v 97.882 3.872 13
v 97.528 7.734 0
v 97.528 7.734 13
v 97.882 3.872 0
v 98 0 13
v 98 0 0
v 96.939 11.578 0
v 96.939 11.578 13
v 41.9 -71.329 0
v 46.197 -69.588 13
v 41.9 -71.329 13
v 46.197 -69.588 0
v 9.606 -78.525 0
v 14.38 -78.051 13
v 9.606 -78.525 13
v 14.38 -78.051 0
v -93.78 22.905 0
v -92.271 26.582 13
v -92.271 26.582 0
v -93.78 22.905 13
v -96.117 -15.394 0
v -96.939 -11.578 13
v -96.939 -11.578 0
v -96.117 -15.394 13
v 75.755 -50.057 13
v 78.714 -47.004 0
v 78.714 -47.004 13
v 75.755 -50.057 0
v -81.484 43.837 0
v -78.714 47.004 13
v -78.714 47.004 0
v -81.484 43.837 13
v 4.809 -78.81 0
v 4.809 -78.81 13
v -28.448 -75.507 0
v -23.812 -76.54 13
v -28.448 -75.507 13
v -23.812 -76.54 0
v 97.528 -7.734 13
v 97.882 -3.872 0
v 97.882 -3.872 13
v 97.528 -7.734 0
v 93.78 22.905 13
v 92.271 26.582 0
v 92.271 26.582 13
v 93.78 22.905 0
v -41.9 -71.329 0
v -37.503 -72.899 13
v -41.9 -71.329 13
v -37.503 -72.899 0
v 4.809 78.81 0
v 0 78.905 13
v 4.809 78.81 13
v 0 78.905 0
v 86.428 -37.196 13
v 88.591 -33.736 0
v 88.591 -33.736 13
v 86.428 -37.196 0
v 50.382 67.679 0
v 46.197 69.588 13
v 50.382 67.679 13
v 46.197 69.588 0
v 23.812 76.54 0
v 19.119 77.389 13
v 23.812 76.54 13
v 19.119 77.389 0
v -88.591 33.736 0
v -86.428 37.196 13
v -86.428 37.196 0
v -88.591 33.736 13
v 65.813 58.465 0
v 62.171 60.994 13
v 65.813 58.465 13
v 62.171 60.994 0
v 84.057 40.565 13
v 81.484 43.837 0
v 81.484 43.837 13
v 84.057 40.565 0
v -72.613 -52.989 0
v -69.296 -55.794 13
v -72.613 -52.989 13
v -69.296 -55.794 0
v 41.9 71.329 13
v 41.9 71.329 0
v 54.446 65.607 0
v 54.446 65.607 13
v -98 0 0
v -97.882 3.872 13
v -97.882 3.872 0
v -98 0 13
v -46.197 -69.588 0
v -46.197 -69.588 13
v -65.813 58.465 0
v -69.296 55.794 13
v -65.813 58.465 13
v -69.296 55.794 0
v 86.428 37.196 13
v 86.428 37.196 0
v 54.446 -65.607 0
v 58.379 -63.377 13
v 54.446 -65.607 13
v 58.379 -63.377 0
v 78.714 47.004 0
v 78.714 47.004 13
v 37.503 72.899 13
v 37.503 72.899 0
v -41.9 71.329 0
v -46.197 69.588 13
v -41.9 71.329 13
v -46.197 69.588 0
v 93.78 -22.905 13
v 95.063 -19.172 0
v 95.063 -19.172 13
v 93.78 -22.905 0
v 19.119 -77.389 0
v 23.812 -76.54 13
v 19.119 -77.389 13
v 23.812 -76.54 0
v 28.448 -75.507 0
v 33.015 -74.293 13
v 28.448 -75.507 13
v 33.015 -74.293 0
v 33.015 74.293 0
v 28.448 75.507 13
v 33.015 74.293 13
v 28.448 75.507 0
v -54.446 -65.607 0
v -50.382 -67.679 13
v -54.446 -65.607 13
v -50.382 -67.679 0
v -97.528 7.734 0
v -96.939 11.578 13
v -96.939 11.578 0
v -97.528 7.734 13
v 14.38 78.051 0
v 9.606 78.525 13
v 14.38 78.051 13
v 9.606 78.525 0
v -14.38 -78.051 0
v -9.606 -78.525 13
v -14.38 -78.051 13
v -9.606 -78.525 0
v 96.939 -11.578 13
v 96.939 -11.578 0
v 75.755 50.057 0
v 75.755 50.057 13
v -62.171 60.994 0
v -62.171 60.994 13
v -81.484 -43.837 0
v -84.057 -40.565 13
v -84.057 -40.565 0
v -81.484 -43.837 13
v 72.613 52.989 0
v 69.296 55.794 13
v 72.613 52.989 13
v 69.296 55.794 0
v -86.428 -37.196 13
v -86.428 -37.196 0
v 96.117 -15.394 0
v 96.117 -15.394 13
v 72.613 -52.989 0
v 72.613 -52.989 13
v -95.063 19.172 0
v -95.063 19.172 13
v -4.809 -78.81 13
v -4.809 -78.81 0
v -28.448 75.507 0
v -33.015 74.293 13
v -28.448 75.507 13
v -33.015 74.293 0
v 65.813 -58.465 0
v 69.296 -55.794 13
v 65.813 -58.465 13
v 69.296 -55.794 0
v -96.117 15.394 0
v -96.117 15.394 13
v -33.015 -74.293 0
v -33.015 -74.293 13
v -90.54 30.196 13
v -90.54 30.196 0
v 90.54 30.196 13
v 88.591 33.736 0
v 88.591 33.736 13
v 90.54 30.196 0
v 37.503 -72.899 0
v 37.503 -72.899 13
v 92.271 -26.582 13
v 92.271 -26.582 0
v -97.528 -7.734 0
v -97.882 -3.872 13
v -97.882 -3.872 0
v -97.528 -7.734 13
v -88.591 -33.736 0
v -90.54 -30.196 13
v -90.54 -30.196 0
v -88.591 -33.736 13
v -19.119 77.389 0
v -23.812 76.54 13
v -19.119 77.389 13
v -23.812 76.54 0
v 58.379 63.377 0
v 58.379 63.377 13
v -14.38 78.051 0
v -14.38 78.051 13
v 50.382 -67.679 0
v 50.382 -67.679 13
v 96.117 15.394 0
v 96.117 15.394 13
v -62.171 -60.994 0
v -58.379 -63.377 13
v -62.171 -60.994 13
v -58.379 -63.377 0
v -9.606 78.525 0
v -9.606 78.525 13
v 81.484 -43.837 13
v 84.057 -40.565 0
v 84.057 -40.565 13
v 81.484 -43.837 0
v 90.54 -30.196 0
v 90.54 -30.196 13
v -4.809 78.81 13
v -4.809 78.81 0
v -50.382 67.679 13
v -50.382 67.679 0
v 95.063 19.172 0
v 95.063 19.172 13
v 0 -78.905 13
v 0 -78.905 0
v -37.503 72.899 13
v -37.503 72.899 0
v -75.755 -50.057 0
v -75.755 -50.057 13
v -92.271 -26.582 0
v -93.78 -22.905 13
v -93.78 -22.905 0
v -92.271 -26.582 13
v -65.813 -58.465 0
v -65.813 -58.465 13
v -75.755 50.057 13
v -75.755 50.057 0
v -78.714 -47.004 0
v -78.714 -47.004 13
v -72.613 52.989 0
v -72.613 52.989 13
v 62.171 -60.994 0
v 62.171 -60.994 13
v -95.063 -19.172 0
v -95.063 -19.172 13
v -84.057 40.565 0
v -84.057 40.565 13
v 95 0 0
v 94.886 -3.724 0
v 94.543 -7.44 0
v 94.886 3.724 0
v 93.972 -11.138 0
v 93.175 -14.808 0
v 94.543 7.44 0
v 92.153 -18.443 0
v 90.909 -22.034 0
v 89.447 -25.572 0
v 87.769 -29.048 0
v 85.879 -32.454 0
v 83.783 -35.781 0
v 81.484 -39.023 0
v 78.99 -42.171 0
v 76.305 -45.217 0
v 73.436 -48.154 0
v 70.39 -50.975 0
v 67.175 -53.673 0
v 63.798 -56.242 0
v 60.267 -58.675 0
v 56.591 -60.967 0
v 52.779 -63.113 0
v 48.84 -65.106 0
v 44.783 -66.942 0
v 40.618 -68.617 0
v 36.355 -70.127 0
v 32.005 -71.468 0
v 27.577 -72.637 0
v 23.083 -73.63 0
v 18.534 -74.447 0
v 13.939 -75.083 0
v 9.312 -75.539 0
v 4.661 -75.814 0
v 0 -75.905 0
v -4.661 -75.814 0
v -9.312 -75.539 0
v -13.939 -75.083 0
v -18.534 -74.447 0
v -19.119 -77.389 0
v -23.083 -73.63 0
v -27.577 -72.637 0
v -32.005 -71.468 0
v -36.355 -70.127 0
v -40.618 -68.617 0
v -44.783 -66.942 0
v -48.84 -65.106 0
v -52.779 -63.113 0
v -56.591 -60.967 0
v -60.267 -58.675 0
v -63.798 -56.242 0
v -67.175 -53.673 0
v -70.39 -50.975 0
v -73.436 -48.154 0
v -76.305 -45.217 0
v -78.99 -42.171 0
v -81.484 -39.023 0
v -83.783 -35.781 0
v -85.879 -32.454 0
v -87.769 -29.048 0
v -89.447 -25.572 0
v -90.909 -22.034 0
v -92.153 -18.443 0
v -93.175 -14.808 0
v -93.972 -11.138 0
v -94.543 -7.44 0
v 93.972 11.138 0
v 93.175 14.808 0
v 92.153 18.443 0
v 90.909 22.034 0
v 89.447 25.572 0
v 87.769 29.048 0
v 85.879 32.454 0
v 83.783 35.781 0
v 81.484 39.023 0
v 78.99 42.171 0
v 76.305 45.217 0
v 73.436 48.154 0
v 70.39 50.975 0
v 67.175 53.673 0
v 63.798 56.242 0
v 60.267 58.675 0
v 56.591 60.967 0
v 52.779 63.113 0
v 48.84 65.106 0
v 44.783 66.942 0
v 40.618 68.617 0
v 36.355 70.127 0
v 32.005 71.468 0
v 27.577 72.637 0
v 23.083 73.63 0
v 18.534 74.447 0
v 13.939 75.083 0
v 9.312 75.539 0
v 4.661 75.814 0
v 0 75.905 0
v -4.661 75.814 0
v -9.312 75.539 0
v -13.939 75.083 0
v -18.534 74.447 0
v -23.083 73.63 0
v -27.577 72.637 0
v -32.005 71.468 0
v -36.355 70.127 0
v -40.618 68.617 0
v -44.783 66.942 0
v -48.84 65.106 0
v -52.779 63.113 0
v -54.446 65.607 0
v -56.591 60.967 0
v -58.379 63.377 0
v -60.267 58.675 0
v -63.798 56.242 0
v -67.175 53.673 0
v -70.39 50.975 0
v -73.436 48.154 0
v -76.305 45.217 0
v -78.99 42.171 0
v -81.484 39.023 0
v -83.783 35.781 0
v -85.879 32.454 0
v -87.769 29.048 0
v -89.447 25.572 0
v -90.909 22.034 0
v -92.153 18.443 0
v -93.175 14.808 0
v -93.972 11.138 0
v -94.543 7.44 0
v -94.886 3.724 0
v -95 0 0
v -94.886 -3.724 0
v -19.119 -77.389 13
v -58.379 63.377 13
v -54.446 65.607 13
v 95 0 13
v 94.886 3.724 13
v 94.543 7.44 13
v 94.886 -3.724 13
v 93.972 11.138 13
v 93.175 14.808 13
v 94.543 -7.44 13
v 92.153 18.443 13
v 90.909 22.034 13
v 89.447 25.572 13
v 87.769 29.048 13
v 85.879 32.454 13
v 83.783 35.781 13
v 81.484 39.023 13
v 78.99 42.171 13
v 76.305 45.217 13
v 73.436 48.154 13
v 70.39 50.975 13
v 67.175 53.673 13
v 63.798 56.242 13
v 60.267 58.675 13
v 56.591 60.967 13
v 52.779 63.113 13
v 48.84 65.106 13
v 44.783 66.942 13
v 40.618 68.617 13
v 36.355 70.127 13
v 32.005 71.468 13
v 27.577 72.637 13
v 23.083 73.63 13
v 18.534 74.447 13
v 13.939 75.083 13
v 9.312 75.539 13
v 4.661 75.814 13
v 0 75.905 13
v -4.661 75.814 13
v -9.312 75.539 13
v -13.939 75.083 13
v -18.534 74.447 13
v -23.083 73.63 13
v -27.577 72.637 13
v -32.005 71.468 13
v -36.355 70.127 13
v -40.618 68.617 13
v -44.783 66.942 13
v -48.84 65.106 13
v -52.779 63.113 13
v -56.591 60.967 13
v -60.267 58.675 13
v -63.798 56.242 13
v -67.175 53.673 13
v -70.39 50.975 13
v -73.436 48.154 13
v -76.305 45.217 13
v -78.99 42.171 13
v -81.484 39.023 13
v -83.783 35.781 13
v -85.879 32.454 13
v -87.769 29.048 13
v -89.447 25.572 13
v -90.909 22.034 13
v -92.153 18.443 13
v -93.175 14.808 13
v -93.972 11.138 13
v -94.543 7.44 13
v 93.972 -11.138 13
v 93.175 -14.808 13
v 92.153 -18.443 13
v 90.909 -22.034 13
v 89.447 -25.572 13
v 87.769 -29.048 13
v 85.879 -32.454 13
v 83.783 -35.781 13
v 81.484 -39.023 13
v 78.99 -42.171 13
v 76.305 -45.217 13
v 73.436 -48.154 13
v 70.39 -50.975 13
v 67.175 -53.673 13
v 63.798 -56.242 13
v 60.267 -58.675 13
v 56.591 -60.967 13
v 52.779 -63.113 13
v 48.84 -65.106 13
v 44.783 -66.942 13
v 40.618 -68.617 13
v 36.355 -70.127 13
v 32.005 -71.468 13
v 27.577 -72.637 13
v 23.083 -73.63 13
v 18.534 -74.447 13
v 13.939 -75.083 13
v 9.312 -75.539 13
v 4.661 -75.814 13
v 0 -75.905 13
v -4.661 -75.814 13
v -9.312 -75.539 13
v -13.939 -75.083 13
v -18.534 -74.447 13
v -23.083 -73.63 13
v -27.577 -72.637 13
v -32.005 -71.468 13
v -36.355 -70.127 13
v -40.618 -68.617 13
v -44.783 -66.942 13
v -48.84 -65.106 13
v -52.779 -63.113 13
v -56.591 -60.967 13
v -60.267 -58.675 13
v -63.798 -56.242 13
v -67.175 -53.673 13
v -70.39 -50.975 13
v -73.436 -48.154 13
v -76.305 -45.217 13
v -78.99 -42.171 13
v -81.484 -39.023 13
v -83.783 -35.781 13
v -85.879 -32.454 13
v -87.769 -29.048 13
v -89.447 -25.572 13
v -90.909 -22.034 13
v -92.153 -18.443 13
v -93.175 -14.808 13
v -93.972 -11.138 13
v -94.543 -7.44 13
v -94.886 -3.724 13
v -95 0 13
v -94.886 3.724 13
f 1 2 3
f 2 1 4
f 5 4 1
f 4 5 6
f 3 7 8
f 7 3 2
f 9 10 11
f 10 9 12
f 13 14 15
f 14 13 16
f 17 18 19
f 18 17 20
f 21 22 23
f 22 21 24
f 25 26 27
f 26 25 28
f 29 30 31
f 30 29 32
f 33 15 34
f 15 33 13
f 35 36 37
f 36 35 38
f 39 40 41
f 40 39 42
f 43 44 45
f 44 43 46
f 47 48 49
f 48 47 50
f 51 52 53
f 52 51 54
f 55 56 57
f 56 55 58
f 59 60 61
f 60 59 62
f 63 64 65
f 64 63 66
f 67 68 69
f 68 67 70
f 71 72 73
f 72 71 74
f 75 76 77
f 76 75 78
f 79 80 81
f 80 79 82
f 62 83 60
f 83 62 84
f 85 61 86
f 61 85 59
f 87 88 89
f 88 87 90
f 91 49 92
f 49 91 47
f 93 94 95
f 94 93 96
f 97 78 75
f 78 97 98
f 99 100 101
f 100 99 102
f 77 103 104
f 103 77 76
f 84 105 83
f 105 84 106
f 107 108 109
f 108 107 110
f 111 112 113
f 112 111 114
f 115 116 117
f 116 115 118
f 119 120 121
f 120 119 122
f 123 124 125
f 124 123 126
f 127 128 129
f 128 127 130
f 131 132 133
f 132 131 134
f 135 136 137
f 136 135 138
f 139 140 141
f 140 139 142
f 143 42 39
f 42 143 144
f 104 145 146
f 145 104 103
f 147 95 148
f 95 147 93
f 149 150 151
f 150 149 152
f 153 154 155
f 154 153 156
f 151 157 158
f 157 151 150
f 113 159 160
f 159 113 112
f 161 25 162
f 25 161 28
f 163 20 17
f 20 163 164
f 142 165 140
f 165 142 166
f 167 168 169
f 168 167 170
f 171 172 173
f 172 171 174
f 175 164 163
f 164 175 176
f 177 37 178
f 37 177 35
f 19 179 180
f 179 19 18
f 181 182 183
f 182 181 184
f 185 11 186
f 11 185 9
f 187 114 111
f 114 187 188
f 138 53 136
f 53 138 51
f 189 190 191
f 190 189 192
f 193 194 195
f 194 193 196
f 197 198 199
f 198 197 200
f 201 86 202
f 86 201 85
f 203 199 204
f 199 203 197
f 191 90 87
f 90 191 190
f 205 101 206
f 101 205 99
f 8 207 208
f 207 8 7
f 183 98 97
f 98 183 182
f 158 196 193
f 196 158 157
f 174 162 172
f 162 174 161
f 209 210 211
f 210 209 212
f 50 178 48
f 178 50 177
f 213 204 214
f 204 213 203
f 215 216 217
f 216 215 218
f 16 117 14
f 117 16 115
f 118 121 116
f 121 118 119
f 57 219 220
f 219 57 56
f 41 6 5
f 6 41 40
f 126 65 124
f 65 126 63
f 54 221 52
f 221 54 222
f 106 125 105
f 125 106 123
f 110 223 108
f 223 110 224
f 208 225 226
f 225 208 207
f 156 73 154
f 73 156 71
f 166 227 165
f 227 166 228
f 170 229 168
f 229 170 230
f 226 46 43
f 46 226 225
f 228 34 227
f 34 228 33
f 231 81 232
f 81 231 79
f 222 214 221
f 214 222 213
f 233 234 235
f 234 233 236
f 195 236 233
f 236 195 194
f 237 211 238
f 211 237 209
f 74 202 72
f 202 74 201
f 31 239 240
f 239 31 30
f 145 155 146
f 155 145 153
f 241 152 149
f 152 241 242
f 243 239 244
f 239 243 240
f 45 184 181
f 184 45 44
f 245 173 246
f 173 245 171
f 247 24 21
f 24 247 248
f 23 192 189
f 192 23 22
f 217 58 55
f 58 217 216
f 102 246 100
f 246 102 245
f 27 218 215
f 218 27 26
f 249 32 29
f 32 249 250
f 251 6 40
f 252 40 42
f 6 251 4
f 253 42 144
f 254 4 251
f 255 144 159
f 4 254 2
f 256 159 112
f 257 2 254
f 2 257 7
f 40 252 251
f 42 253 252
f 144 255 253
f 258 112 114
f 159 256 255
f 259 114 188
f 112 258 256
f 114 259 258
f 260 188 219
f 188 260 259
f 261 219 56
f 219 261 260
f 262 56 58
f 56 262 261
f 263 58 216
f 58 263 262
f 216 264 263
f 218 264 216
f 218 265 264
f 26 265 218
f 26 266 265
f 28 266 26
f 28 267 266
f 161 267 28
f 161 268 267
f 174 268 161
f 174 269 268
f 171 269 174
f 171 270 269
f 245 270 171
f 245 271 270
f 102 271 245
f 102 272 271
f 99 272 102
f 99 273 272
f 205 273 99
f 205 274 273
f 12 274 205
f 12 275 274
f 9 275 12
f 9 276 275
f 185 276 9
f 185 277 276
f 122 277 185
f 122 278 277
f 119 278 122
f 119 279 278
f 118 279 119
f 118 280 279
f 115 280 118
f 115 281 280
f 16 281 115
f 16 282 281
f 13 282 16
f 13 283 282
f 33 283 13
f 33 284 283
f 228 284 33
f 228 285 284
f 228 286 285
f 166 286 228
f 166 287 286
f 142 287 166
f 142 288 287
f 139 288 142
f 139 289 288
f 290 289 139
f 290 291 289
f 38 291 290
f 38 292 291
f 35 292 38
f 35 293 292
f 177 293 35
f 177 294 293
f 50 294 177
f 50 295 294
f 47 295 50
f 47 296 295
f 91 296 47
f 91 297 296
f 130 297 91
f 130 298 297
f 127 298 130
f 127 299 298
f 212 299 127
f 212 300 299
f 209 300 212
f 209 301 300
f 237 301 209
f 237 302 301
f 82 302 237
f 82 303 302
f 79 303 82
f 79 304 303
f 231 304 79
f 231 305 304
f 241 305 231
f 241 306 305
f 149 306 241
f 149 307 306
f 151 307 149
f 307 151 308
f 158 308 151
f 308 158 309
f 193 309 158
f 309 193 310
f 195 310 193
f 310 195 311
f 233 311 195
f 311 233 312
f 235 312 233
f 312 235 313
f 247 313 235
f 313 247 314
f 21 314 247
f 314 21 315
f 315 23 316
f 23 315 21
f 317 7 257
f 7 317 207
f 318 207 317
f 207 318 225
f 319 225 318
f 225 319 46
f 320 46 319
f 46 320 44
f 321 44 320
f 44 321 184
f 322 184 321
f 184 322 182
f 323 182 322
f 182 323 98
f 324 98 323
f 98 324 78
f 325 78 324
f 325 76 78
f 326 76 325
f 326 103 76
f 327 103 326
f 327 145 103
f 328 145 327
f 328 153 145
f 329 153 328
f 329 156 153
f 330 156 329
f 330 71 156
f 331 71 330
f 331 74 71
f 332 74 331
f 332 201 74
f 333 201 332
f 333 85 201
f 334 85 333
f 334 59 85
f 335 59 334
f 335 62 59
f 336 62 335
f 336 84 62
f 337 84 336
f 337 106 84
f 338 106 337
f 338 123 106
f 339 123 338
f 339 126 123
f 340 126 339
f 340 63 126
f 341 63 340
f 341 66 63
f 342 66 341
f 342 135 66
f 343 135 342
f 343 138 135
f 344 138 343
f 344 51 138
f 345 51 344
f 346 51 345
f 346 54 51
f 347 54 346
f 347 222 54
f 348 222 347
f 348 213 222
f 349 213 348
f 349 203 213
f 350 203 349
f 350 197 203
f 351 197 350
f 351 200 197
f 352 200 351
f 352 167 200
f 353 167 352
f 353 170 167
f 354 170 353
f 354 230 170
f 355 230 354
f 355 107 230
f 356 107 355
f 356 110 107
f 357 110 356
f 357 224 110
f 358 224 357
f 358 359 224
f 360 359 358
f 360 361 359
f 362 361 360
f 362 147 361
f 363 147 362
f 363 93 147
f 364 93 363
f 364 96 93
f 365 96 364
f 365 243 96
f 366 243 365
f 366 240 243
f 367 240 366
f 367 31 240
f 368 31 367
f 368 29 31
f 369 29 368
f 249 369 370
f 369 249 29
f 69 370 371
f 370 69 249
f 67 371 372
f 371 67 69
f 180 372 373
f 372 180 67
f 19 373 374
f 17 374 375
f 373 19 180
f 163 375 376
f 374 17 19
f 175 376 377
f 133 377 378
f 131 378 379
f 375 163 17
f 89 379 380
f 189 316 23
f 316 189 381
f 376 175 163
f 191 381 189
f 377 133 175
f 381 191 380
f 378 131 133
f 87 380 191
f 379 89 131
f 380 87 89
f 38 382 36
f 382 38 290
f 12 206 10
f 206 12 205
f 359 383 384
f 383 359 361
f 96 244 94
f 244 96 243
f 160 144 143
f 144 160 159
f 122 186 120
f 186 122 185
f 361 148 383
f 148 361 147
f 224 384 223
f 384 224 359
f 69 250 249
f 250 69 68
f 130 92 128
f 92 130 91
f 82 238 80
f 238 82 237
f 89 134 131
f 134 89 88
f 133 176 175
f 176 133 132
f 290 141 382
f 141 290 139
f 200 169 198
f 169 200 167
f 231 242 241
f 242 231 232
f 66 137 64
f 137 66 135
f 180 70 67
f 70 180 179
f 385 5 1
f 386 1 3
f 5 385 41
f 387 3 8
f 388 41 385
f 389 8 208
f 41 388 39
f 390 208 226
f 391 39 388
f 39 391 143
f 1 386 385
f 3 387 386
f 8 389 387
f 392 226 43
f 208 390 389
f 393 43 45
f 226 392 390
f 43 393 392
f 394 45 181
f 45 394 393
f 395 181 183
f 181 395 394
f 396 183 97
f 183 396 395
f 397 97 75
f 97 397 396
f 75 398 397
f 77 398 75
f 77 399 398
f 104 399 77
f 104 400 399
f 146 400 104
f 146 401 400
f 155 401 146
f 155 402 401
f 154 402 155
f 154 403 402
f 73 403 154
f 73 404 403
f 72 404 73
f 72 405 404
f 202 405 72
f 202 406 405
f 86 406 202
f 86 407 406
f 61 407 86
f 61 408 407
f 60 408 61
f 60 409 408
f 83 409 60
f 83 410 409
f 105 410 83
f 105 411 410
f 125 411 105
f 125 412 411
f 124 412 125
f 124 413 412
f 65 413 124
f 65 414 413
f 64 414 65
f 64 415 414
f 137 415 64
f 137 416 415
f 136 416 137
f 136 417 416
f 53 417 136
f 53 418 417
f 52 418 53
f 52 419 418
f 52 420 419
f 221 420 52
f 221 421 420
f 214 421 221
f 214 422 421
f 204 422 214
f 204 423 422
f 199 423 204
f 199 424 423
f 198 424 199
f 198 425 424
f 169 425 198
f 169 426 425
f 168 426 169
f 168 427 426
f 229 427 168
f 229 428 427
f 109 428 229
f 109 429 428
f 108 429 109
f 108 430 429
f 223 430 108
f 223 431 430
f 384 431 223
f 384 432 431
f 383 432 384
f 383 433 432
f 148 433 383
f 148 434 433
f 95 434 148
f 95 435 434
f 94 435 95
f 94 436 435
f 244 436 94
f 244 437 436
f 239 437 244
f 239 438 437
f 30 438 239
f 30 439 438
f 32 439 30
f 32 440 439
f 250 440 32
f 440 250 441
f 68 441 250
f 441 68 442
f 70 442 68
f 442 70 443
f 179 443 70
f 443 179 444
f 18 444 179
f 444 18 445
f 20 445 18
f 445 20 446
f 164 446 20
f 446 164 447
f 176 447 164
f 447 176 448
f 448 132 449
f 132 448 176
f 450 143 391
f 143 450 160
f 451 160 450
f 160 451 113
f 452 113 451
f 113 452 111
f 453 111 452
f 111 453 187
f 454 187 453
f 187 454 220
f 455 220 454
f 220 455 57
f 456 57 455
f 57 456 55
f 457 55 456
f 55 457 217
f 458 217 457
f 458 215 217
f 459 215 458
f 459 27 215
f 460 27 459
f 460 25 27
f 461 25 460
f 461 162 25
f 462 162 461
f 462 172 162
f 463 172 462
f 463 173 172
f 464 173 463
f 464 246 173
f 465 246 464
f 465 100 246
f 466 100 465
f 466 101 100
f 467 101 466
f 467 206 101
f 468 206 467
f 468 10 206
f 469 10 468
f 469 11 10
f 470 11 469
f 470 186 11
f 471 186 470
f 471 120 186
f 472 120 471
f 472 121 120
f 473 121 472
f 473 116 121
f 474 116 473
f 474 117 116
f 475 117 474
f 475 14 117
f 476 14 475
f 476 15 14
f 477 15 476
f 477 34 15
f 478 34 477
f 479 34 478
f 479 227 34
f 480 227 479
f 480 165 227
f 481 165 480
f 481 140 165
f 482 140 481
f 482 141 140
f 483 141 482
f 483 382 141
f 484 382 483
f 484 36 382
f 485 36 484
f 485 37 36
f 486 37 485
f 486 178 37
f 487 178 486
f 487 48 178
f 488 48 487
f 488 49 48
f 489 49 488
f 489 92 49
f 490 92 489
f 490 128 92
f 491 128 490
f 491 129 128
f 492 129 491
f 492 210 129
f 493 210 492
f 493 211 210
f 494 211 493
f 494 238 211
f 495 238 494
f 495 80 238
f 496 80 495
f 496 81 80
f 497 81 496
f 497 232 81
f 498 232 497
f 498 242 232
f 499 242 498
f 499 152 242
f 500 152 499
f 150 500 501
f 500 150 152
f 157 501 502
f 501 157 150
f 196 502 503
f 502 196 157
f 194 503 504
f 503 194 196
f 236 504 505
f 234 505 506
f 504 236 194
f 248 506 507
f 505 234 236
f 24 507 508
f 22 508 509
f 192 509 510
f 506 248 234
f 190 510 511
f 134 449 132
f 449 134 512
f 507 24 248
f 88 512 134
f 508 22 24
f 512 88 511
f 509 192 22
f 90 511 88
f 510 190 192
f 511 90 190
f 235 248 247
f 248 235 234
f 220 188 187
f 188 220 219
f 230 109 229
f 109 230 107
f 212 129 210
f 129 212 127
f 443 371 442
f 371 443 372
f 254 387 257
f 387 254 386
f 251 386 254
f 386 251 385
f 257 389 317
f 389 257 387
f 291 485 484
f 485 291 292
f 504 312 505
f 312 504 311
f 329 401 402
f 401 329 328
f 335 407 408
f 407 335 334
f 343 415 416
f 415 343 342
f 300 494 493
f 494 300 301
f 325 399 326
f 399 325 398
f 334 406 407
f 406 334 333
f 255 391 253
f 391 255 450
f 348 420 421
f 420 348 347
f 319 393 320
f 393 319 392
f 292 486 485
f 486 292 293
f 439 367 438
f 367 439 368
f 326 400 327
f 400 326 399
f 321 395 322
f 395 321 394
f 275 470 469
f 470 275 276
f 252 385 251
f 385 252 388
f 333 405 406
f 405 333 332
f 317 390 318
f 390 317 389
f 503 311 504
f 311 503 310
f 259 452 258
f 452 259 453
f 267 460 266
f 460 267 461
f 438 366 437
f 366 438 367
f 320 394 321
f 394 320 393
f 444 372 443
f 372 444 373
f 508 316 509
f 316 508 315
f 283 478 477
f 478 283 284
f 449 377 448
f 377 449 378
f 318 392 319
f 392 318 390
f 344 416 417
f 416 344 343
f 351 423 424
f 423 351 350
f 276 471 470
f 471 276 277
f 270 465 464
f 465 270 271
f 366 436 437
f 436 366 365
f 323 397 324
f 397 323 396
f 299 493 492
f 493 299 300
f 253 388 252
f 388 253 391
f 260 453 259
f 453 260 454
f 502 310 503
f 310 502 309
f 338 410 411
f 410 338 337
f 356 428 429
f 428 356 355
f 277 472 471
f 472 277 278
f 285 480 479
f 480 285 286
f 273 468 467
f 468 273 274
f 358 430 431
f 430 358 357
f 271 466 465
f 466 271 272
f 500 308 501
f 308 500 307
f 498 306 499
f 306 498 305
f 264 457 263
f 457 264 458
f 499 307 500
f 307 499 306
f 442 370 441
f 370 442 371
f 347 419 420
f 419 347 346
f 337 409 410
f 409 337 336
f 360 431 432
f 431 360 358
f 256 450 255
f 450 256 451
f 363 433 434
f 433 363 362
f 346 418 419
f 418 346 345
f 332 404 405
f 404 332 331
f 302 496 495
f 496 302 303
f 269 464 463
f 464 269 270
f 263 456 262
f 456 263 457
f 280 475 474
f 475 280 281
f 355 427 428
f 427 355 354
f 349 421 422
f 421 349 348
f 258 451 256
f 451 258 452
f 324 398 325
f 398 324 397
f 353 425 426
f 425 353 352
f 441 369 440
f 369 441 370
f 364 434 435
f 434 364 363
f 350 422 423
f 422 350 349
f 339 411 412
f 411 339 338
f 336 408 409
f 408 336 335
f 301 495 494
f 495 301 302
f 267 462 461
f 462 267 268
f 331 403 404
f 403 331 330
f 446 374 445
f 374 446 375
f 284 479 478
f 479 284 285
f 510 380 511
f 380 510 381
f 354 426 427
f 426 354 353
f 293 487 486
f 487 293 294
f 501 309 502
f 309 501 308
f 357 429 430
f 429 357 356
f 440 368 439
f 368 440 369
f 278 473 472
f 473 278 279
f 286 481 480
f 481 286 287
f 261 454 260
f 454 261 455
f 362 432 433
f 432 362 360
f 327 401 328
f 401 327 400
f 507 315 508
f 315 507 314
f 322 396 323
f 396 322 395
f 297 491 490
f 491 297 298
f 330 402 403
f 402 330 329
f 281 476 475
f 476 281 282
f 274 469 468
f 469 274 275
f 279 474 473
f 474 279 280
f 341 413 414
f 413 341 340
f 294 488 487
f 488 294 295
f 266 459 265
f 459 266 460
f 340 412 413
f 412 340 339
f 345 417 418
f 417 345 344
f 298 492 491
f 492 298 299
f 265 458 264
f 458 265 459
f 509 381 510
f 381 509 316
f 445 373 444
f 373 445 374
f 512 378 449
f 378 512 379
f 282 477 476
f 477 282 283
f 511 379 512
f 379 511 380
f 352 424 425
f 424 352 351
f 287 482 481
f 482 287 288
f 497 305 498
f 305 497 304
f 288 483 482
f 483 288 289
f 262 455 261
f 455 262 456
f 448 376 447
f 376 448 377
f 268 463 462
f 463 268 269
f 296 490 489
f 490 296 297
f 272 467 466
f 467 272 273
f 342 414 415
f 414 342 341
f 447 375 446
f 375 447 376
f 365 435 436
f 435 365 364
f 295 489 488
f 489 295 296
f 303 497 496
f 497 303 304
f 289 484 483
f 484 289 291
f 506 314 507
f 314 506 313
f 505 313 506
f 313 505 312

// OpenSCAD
BaseWidth=152*1;
BaseLength=190*1;


//Measure your head in mm with a sewing tape measure
HeadCircumference_mm = 540; //[450:750]
//13mm is a average size
BandHeight_mm=13;//[3:20]
//3mm thick is still flexible
BandThickness_mm=3;//[1:8]
//Determines number of sides / facets... more is smoother
$fn=128;

CircPercent = HeadCircumference_mm/540;
CalcLength = BaseLength*CircPercent/2;
CalcWidth = CalcLength*0.799;
echo(CalcLength);
echo(CalcWidth);

//Define an Oval (shape of band)
module oval(w,h, height, center = false) {
 scale([1, h/w, 1]) cylinder(h=height, r=w, center=center); 
};
//Create the Band, with hole in back for rear ornament

    difference() {oval (CalcLength+BandThickness_mm,CalcWidth+BandThickness_mm,BandHeight_mm,center=false,center=false);
translate ([0,0,-1]) oval (CalcLength,CalcWidth,BandHeight_mm+2,center=false);}
